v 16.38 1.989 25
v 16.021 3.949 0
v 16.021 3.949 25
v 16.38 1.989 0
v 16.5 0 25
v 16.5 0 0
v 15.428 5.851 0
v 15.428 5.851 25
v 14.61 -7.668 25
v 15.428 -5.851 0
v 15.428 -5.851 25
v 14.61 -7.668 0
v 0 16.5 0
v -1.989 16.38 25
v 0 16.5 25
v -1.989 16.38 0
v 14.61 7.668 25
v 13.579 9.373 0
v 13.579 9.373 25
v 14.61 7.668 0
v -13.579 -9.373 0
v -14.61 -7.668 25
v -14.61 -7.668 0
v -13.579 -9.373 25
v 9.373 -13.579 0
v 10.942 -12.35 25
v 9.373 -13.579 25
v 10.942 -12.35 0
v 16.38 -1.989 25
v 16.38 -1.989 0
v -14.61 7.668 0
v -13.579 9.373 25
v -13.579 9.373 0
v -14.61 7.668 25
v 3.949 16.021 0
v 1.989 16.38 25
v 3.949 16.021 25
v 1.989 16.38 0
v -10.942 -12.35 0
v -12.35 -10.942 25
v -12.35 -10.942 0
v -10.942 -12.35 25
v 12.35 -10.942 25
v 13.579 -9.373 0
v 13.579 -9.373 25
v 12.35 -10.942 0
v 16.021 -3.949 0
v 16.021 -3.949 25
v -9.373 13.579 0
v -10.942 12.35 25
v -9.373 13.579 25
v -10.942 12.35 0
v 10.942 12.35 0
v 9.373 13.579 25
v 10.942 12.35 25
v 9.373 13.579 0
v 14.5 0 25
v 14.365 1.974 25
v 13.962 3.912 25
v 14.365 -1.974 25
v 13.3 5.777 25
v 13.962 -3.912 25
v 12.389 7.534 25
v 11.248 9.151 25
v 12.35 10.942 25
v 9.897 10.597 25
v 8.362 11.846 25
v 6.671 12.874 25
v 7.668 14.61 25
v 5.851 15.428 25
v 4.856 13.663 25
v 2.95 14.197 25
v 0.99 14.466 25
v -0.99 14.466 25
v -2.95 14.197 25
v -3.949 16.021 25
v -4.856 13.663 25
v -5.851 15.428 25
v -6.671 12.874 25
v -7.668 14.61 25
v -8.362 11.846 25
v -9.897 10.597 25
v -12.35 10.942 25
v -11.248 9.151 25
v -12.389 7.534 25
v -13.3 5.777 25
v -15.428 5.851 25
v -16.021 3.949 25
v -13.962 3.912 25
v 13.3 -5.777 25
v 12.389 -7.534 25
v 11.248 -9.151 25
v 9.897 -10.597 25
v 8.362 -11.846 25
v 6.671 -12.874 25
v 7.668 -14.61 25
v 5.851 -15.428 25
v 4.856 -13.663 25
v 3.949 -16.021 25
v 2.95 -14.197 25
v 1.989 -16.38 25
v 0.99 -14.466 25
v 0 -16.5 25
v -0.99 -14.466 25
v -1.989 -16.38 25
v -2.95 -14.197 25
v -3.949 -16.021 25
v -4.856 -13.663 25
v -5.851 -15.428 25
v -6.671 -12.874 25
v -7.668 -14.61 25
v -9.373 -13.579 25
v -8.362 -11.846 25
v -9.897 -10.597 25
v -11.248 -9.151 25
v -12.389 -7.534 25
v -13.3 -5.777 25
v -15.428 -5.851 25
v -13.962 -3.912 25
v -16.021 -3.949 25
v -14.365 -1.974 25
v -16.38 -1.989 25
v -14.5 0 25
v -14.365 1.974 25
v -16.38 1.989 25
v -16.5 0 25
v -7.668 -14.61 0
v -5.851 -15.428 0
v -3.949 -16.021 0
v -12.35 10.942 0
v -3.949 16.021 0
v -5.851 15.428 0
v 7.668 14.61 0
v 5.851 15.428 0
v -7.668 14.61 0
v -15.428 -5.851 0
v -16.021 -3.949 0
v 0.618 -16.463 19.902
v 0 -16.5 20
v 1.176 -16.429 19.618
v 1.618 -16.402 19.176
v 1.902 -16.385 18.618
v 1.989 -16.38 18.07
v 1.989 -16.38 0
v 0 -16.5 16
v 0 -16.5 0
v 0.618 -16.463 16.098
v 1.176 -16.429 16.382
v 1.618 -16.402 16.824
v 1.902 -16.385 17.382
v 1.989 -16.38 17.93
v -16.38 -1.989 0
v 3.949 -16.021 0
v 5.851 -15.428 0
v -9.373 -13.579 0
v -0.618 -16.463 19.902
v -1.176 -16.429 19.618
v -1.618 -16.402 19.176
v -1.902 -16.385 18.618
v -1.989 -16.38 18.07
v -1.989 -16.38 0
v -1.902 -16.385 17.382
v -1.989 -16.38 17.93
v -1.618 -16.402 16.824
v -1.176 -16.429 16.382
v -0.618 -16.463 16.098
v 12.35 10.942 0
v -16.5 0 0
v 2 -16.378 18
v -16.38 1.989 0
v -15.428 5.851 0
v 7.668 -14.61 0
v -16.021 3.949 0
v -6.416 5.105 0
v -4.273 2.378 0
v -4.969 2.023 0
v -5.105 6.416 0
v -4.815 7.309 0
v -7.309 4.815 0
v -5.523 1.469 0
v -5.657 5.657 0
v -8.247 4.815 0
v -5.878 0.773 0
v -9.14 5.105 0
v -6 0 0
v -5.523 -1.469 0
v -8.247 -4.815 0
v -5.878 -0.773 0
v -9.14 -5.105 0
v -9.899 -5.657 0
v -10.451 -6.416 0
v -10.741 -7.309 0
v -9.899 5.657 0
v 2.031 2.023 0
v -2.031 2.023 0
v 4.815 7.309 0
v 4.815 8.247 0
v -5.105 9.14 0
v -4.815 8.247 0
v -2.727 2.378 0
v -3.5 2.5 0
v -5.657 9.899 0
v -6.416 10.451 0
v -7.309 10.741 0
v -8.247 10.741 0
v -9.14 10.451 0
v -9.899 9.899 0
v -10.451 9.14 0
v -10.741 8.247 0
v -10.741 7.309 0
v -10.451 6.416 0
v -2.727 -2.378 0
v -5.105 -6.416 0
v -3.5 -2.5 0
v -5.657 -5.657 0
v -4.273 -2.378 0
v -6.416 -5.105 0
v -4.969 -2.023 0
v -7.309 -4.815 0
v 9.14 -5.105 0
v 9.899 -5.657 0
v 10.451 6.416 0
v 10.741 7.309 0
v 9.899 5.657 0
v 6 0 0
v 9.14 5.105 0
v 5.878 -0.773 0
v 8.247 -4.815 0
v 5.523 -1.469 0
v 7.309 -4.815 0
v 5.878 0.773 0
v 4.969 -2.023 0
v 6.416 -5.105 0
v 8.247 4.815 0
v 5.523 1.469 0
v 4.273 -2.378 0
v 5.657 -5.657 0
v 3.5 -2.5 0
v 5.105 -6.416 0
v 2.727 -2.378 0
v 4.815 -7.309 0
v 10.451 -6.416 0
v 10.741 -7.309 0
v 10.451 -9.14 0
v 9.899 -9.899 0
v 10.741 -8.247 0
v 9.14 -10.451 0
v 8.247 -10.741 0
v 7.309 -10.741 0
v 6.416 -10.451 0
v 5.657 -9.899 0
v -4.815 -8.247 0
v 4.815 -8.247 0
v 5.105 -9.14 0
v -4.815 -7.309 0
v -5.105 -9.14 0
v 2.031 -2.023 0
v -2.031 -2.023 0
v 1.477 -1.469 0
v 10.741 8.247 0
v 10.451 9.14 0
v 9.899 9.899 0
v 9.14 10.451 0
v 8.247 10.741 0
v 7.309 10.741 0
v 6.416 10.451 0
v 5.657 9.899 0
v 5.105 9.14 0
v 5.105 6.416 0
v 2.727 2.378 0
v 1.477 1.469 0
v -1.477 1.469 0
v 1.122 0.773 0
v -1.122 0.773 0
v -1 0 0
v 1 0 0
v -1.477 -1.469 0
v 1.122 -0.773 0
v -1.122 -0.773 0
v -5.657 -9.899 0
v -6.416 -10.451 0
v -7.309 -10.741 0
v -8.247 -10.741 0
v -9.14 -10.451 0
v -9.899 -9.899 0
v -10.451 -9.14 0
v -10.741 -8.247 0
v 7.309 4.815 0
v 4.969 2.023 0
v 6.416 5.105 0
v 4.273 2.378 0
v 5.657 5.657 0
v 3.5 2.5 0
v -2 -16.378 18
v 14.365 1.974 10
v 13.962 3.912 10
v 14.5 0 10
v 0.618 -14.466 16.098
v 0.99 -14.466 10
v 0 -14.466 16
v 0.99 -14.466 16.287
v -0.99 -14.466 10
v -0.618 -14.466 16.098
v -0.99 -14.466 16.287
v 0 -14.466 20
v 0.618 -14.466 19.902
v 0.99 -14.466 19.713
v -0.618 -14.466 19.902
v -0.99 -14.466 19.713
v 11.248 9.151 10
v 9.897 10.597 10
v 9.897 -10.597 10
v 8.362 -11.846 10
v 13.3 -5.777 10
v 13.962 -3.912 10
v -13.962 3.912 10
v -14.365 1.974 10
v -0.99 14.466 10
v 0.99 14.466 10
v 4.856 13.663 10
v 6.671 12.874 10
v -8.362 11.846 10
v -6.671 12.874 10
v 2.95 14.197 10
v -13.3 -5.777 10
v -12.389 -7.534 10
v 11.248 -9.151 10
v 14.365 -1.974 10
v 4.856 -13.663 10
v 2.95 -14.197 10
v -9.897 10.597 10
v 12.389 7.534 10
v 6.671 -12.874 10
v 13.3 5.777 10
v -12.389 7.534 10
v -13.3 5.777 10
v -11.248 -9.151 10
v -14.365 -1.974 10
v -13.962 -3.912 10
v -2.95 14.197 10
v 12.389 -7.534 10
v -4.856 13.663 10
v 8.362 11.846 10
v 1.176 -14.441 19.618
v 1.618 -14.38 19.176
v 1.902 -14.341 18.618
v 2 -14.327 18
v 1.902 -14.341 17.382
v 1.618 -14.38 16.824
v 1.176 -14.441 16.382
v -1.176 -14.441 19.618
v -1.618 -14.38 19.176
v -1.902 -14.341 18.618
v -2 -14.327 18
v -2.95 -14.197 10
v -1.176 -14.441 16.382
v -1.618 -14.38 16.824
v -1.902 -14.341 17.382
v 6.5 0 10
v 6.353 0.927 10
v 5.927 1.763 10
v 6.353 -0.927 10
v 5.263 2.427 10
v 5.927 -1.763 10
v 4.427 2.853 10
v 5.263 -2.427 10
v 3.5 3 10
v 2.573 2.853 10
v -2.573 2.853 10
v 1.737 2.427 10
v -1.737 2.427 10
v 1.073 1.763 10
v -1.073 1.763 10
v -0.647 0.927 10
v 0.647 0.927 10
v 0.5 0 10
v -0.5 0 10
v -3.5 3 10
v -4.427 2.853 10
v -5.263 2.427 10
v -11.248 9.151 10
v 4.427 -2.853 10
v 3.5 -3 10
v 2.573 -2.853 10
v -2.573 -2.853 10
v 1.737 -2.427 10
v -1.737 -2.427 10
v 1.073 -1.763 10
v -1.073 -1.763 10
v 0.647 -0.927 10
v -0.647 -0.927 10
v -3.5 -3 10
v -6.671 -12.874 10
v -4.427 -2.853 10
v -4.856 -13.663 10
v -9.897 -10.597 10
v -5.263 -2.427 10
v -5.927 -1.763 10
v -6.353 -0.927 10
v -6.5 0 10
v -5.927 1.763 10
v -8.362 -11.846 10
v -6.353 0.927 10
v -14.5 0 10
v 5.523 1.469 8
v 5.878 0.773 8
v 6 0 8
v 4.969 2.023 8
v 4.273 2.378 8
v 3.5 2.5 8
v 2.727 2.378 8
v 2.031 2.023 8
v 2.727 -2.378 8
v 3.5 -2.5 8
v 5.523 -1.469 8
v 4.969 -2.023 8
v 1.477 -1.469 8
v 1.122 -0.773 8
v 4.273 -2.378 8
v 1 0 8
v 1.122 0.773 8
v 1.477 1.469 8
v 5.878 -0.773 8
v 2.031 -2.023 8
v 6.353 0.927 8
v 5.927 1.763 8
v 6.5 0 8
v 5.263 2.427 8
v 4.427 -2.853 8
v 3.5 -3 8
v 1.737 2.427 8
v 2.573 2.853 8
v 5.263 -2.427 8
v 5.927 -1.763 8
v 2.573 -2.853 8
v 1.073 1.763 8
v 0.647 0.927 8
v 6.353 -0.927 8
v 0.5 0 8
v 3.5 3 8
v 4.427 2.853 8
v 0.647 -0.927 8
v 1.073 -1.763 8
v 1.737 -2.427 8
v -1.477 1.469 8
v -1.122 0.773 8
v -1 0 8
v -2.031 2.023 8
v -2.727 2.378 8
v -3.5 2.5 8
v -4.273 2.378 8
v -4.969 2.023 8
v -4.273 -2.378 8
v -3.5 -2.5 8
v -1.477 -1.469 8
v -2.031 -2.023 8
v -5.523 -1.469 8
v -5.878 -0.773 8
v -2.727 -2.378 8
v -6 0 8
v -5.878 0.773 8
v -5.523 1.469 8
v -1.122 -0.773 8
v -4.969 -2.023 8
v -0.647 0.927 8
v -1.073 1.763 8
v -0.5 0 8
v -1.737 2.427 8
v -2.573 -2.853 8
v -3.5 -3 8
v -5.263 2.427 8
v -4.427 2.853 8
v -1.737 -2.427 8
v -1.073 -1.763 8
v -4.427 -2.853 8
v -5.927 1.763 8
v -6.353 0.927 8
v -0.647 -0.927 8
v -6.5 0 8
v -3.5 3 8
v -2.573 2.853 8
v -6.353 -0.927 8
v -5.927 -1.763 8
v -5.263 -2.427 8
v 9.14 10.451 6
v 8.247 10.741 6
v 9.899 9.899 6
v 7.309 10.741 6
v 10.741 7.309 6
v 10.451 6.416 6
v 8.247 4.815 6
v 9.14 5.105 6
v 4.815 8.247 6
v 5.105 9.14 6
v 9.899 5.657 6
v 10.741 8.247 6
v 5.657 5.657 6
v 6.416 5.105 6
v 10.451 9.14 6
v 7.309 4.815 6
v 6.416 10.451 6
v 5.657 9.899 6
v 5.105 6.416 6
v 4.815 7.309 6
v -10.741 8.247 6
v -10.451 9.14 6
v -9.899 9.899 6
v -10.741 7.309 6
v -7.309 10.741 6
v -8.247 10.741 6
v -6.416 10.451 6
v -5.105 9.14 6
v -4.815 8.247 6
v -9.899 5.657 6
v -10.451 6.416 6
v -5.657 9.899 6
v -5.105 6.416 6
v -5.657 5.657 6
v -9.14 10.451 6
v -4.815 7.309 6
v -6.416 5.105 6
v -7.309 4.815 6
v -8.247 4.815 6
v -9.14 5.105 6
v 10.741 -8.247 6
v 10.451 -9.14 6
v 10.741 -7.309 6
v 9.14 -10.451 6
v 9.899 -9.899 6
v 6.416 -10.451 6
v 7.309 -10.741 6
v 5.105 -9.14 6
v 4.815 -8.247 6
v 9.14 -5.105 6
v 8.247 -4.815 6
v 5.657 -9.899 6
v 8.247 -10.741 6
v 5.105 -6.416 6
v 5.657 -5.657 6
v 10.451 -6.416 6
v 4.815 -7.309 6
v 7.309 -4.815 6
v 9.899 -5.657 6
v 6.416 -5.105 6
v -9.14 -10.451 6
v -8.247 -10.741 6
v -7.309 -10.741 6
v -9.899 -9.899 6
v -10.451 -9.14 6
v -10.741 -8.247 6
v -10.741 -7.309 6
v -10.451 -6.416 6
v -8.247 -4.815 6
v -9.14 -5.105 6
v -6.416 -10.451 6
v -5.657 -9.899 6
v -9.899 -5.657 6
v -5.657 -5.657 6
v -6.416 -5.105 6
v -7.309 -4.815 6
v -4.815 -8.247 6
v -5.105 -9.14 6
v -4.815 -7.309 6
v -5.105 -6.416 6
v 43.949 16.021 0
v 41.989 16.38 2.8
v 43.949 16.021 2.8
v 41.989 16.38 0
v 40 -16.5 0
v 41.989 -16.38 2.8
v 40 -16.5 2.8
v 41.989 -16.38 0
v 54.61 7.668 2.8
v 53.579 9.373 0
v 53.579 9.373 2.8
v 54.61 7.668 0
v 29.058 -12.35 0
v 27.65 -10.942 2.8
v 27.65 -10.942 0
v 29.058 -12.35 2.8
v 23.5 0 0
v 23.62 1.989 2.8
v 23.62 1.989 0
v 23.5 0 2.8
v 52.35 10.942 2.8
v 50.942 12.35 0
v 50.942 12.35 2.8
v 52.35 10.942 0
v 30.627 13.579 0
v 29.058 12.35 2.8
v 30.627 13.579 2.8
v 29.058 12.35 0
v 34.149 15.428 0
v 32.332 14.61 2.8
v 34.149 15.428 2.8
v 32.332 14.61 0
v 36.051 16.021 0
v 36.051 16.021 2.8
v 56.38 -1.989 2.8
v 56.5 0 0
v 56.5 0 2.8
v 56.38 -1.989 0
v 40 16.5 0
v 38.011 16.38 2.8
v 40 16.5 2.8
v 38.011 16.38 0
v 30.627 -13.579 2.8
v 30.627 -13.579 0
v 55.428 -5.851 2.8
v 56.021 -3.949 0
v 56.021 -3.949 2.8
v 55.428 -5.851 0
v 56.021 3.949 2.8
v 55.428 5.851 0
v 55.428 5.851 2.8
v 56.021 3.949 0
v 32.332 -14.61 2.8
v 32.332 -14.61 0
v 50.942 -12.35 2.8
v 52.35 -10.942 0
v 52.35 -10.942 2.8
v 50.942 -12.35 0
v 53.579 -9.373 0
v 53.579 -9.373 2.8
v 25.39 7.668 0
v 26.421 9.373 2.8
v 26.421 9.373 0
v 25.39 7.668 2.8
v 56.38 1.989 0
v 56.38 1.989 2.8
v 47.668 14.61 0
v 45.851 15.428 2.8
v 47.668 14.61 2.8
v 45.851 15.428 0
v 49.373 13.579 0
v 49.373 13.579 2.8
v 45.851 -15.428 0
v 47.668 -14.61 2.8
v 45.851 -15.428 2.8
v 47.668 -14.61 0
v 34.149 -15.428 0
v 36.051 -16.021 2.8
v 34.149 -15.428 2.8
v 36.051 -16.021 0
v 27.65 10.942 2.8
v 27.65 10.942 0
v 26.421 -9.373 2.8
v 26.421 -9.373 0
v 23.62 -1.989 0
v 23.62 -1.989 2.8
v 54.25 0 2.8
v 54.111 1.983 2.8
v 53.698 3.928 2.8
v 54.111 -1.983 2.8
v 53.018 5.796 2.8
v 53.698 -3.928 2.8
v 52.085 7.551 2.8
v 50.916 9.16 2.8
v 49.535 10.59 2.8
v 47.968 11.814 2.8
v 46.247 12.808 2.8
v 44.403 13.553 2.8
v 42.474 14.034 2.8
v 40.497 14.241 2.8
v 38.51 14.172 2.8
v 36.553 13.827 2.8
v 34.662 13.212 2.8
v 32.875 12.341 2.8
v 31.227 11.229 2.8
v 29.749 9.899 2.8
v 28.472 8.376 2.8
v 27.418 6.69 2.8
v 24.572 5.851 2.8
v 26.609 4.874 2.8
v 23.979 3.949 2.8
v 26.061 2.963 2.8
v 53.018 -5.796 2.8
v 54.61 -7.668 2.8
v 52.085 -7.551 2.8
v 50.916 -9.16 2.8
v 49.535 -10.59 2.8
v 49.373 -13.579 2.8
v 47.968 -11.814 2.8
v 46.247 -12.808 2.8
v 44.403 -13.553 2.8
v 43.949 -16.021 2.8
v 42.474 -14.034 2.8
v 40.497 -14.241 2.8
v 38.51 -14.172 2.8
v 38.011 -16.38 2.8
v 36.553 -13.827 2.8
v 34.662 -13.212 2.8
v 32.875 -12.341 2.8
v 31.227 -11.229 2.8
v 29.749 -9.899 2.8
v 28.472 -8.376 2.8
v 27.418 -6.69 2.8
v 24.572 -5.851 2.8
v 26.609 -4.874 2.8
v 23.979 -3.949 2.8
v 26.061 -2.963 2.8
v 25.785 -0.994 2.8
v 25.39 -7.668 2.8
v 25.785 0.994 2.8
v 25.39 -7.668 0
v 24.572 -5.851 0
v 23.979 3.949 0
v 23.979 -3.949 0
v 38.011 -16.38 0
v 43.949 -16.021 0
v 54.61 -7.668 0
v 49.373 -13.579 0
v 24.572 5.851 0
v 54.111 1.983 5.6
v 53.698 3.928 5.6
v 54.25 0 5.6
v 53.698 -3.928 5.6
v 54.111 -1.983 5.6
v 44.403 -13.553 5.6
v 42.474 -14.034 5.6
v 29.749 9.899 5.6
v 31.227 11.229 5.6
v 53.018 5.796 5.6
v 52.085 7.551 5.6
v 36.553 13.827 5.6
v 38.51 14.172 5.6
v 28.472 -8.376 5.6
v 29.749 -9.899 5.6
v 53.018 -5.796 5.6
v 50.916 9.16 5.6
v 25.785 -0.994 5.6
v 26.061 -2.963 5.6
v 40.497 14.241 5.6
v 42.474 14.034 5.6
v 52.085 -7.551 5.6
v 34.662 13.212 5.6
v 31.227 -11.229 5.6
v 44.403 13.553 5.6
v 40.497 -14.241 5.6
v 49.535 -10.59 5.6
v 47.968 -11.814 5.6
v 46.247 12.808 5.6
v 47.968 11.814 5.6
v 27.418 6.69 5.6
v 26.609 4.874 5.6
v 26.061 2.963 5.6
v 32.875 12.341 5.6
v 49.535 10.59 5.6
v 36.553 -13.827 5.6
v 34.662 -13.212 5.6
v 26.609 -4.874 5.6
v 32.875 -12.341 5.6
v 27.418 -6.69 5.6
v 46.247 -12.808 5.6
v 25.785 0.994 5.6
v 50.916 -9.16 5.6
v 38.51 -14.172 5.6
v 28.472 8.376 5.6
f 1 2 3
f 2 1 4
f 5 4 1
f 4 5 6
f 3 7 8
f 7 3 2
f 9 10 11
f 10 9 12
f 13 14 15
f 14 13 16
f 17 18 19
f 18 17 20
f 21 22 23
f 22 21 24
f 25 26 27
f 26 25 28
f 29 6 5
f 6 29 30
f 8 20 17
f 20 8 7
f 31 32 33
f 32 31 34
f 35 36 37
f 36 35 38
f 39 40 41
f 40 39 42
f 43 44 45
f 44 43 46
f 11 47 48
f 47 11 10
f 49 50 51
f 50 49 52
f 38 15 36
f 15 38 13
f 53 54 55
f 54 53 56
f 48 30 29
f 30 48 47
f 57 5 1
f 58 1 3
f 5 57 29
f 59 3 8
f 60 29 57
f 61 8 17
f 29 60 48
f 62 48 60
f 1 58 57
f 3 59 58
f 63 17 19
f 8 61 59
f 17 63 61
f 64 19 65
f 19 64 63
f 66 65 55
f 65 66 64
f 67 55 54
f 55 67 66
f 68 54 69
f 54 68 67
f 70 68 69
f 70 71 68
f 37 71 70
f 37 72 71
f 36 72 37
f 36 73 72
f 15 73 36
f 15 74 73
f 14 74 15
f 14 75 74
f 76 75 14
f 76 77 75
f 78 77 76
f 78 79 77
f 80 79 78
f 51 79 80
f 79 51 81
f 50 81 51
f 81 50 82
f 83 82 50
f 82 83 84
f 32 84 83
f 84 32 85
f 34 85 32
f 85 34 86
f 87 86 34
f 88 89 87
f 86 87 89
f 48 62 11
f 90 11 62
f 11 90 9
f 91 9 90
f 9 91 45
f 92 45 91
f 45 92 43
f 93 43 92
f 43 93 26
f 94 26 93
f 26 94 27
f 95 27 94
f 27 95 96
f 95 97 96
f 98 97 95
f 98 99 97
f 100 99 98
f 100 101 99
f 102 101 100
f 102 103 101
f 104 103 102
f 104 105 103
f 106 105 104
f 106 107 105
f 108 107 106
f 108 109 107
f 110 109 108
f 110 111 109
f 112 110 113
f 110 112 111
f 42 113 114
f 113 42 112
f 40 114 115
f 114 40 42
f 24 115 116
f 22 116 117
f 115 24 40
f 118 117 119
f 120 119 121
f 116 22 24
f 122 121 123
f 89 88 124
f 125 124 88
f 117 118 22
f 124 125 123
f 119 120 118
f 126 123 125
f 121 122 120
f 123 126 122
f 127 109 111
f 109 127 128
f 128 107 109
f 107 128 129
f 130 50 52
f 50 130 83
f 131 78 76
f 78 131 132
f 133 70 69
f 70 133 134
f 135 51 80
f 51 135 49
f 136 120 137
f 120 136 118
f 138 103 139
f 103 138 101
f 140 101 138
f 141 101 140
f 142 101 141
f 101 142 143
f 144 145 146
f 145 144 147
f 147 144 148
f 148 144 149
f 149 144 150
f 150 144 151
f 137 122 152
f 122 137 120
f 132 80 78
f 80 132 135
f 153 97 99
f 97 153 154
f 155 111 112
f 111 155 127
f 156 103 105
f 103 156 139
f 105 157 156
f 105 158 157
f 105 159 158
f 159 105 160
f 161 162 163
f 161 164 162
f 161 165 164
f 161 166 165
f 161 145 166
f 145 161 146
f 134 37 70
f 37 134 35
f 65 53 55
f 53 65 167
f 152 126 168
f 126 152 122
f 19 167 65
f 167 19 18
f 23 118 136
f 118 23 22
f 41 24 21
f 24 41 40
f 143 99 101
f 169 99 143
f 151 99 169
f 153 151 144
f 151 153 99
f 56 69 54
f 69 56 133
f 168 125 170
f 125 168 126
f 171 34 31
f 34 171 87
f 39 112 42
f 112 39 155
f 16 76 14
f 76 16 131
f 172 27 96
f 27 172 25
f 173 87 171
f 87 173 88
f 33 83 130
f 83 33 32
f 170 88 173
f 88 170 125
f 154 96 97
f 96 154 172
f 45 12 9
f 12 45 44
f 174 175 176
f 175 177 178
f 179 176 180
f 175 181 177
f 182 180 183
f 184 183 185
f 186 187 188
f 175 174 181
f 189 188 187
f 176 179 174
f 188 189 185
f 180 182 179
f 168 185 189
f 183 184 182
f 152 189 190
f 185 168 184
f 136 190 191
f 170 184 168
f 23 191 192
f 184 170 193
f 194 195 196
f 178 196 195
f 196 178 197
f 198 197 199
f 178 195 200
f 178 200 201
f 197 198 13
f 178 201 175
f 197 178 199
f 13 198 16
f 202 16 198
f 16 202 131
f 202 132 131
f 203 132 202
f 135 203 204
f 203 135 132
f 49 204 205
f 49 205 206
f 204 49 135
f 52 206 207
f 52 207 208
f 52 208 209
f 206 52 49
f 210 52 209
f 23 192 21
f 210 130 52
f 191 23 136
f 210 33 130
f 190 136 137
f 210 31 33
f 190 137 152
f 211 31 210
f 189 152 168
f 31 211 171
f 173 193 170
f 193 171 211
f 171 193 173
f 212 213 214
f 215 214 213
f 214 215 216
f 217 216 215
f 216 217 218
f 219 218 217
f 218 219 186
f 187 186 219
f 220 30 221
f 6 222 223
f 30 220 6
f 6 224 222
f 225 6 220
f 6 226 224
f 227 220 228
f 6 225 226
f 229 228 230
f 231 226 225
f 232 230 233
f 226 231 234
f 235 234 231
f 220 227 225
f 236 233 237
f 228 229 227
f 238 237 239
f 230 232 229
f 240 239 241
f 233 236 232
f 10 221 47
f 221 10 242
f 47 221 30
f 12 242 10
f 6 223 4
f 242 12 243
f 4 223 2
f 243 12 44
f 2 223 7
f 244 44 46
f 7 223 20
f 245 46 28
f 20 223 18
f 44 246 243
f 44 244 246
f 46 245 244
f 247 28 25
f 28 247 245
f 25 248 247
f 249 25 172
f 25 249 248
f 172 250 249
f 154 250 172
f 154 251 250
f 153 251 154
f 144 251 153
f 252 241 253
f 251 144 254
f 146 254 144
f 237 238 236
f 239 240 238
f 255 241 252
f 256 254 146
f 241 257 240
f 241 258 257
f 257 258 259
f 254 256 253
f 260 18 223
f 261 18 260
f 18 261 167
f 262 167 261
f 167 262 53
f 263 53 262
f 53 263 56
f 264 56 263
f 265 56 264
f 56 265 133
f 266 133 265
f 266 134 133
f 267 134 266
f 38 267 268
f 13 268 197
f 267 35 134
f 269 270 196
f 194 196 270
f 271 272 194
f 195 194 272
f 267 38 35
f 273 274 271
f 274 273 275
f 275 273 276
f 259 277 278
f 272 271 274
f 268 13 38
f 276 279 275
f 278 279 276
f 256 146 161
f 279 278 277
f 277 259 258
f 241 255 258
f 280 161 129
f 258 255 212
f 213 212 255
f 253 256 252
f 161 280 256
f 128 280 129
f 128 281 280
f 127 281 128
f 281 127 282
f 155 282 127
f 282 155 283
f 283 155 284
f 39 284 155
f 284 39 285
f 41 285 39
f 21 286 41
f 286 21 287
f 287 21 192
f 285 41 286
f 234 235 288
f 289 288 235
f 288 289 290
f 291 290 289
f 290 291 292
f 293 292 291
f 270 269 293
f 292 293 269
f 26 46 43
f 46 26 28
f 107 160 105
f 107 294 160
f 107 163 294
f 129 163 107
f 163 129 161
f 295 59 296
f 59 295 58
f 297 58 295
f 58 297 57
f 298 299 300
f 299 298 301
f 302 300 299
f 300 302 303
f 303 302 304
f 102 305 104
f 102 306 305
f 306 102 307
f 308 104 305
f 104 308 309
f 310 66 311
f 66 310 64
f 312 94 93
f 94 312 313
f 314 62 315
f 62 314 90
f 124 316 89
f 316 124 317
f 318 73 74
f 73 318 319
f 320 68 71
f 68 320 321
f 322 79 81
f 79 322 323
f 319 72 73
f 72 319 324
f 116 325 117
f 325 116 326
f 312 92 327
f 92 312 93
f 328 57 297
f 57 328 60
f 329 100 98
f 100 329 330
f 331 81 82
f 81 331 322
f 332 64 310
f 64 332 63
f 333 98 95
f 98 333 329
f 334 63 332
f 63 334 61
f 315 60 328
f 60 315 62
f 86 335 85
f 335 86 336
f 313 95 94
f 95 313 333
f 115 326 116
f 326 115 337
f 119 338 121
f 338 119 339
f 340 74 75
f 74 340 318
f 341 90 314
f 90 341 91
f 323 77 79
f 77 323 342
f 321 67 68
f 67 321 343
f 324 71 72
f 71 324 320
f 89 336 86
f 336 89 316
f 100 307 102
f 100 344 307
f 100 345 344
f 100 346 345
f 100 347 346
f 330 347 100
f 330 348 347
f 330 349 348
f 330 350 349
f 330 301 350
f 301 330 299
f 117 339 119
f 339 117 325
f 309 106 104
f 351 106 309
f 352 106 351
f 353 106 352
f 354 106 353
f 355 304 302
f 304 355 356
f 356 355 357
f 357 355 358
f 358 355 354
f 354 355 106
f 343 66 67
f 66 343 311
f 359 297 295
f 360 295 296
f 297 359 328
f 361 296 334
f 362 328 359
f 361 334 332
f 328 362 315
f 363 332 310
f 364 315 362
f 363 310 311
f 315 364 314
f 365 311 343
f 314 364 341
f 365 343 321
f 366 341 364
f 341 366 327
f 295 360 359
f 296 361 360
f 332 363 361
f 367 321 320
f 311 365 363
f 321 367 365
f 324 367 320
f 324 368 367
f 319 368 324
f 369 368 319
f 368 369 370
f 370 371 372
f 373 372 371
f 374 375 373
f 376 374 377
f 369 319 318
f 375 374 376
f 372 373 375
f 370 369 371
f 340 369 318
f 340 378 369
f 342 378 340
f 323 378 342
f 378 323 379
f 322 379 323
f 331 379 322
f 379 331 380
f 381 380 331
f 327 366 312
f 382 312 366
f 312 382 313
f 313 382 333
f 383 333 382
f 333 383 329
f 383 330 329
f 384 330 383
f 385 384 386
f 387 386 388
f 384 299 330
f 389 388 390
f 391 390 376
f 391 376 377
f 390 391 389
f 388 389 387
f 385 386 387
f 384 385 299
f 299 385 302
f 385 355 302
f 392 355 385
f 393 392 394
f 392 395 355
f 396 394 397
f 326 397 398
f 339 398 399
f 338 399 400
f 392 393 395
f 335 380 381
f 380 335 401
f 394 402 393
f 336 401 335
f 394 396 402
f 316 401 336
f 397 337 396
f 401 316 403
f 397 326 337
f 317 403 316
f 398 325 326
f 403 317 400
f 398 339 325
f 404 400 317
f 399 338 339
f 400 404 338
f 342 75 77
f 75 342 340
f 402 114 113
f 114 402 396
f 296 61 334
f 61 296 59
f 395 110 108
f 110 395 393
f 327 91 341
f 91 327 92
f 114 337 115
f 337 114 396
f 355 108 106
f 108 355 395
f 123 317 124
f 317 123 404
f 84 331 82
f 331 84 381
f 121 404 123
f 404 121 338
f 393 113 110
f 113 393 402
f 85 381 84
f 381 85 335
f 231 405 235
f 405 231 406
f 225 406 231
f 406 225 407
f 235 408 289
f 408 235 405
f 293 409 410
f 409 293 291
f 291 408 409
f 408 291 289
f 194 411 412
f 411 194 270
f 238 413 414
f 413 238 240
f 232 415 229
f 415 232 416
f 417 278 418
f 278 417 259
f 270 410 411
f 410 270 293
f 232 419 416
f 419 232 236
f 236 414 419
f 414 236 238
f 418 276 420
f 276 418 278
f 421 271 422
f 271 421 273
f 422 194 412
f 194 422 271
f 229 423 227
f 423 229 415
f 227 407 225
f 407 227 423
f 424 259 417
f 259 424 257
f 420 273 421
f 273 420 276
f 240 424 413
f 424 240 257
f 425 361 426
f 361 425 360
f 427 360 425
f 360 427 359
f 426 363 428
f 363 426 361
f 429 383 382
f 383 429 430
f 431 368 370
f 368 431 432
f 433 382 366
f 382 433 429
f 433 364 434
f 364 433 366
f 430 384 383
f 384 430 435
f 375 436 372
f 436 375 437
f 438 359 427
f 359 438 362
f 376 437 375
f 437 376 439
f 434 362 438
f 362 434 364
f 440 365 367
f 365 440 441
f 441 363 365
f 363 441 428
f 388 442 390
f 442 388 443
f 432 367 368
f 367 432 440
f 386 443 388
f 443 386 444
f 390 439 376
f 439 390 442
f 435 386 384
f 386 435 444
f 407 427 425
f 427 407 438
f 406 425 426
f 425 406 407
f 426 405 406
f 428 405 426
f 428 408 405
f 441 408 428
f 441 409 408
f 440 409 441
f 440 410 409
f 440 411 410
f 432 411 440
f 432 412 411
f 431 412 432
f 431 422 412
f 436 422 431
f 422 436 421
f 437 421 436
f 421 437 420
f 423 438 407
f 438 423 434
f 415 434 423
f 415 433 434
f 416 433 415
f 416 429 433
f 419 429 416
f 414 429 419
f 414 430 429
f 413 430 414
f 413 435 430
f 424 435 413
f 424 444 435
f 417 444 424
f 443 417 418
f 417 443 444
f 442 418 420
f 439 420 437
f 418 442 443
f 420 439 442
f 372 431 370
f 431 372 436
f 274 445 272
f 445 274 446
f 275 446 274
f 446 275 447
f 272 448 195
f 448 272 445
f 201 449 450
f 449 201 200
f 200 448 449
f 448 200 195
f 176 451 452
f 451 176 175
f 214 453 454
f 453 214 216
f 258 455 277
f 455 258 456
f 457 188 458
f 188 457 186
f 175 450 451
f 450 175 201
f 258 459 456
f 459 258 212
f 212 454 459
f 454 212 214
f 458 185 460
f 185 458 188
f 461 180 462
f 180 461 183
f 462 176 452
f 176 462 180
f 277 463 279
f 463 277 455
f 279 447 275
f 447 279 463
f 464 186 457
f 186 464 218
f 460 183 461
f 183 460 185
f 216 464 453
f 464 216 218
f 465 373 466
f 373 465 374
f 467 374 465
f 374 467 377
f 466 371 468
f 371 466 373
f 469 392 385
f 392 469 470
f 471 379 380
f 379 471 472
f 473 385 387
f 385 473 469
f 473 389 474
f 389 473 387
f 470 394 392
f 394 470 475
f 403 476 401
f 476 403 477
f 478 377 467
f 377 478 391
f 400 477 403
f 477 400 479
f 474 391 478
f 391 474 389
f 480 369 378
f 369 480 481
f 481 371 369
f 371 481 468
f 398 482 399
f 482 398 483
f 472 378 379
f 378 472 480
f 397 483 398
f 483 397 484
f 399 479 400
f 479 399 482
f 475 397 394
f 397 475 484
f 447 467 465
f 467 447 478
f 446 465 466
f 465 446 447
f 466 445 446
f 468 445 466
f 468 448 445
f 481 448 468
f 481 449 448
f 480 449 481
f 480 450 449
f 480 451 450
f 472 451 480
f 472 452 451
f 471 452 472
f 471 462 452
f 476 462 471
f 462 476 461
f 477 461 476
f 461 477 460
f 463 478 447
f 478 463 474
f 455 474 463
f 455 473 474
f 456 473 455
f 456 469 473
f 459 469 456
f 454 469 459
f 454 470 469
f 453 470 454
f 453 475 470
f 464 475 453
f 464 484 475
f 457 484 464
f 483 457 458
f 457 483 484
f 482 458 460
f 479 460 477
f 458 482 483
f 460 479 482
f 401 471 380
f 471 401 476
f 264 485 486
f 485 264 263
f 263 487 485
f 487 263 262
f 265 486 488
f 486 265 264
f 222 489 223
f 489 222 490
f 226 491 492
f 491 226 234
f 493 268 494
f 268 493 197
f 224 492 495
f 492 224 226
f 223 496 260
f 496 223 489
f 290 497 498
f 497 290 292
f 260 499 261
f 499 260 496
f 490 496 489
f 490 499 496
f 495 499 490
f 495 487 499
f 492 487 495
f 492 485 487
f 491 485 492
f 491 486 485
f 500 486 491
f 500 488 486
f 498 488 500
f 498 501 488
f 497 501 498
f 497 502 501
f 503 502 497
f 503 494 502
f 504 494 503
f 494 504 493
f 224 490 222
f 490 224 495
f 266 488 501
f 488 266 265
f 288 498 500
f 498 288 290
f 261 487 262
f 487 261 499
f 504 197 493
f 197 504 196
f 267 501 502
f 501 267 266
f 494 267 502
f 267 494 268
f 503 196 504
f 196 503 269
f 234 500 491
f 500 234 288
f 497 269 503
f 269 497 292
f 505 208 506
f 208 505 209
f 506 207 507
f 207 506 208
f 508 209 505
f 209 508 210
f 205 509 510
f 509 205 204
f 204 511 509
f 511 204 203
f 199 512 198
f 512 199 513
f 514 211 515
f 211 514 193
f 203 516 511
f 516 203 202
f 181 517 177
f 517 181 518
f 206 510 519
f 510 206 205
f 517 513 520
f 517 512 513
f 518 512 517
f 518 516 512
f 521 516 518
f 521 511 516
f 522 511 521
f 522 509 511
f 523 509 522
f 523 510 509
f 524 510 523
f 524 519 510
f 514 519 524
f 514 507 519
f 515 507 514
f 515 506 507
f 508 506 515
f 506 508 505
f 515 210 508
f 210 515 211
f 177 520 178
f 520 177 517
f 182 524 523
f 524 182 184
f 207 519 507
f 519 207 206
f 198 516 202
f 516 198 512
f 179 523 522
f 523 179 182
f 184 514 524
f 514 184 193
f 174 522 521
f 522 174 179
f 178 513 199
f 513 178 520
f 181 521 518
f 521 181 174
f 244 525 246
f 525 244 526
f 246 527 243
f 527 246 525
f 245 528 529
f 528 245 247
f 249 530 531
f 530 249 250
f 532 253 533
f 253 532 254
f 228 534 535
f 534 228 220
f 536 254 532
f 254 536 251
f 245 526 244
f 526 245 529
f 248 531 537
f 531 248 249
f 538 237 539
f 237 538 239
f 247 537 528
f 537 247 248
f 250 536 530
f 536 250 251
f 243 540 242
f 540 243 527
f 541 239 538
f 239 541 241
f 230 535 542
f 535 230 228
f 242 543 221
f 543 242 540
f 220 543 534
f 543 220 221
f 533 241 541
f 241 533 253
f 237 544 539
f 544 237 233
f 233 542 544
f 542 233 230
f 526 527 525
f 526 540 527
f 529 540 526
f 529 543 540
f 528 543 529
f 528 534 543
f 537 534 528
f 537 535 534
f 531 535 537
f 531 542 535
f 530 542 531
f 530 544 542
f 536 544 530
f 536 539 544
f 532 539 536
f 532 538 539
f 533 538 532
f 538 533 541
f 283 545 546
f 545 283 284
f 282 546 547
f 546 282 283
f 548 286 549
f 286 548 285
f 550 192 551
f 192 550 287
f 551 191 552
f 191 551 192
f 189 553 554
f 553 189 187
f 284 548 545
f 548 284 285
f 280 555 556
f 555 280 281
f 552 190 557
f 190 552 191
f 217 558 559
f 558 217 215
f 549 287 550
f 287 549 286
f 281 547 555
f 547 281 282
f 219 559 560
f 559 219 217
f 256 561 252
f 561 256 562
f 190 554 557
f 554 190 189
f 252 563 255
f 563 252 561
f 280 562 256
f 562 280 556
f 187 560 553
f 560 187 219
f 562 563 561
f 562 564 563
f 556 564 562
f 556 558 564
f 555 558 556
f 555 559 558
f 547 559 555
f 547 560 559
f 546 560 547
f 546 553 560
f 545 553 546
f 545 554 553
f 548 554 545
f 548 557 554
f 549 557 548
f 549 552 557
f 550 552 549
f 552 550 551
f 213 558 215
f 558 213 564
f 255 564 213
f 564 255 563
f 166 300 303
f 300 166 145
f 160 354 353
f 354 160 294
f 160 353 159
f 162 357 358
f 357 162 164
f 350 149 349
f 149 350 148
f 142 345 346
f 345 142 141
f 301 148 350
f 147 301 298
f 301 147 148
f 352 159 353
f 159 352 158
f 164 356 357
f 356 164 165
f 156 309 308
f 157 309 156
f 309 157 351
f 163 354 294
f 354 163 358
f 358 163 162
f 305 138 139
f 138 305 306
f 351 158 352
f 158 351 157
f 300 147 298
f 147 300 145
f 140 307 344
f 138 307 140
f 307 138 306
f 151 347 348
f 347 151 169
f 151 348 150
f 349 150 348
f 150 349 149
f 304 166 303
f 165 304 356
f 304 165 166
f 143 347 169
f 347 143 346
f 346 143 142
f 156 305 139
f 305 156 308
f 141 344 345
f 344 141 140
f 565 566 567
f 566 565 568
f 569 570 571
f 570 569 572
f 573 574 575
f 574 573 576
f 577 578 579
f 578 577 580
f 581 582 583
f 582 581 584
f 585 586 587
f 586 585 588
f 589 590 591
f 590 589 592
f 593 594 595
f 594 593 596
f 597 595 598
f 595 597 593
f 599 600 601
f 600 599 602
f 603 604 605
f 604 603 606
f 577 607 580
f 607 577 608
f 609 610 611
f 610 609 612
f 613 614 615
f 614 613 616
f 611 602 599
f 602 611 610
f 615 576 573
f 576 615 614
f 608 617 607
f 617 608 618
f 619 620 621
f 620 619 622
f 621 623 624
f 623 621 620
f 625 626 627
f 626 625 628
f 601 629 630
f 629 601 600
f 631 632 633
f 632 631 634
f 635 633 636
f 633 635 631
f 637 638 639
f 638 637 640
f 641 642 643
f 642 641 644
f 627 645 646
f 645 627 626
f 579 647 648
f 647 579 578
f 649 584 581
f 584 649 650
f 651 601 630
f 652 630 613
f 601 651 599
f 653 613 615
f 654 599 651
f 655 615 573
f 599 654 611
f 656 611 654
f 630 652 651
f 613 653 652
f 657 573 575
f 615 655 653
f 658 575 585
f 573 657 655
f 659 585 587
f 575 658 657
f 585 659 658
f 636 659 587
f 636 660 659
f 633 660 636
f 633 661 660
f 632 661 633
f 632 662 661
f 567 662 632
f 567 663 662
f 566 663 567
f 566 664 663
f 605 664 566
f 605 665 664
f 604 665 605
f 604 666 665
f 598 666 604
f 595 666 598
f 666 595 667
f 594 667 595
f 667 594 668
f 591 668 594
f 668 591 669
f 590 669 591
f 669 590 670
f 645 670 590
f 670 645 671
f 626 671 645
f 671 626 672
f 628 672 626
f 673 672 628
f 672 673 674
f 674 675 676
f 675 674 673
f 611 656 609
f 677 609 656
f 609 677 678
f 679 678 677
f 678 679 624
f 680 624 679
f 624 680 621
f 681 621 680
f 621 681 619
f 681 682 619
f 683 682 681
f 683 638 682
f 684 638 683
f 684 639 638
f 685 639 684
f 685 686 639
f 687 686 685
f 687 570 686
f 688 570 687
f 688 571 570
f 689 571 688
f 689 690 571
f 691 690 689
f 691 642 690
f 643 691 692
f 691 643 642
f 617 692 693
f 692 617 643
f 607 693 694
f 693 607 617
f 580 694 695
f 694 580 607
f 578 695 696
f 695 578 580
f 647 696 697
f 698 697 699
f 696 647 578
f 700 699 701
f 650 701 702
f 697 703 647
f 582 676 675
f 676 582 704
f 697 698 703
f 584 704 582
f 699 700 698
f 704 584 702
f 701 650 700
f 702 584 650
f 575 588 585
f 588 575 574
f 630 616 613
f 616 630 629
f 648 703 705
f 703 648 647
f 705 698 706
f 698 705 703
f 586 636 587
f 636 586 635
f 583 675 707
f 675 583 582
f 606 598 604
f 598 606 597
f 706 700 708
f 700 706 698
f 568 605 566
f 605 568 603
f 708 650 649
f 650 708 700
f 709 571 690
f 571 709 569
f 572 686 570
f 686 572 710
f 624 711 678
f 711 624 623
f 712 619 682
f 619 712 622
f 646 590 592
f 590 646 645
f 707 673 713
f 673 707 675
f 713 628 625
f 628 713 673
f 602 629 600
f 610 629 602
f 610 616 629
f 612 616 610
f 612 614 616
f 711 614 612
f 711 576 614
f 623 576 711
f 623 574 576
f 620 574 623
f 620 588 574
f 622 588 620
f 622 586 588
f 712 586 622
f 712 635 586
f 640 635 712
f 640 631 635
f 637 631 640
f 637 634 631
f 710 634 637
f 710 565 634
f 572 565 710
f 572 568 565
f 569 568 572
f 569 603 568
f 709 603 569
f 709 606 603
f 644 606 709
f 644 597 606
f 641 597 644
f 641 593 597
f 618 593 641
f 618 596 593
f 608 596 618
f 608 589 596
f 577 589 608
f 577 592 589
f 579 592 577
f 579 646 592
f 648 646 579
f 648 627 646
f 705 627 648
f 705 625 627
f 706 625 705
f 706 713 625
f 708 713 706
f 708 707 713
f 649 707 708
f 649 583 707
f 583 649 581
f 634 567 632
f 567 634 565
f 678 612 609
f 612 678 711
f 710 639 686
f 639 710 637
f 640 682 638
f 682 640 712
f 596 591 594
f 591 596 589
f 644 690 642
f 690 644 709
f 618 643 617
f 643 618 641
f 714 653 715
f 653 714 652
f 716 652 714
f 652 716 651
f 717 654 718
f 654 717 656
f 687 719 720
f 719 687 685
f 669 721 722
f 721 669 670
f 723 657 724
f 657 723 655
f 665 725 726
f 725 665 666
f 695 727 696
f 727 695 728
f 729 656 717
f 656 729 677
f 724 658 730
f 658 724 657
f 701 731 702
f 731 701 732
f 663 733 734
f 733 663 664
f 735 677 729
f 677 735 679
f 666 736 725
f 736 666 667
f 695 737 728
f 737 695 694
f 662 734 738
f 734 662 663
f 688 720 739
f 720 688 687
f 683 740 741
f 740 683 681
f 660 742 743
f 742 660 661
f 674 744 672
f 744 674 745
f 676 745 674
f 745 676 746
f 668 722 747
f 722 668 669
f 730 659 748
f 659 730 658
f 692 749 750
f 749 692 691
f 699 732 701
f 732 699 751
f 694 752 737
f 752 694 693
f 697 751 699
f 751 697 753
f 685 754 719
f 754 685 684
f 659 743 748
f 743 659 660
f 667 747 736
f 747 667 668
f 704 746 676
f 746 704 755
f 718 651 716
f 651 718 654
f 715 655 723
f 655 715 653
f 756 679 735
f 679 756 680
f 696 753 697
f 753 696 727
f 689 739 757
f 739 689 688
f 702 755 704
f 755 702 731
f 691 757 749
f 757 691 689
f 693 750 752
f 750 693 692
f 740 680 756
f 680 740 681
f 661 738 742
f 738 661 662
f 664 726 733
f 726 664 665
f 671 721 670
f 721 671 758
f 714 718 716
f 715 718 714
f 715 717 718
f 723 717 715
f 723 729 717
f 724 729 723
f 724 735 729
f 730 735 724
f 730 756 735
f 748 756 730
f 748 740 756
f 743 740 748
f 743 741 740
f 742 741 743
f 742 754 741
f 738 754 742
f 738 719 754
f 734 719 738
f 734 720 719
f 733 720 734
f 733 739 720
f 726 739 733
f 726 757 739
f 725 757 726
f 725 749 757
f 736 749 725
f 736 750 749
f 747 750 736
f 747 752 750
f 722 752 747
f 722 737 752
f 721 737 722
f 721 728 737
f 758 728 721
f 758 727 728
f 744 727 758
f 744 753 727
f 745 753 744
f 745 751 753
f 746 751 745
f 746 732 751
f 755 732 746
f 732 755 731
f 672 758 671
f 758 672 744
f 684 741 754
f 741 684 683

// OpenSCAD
$fa = 1;

module magnethole()
{
  translate([0,0,-0.1]) cylinder(r=3, h=6.1, $fn=20);
}
//magnethole();


module ledhole()
{
  translate([0,0,-0.1]) cylinder(r=2.5, h=20, $fn=20);
  translate([0,0,8]) cylinder(r=3, h=20, $fn=20);
}
//ledhole();

module outer()
{
  difference() {
	cylinder(r=16.5, h=25);
      translate([0, 0, 10]) cylinder(r=14.5, h=25);
//      translate([0, 0, -1]) cylinder(r=6.5, h=5);
  }
}

module lid()
{
  union()
 {
    cylinder(r=16.5, h=2.8);
    translate([0,0,2.8]) cylinder(r=14.25, h=2.8);
  }
}

//lid();

union() {
difference() {
  outer();
  rotate(45) translate([11,0,0]) magnethole();
  rotate(135) translate([11,0,0]) magnethole();
  rotate(-45) translate([11,0,0]) magnethole();
  rotate(-135) translate([11,0,0]) magnethole();

  translate([3.5,0,0]) ledhole();
  translate([-3.5,0,0]) ledhole();
  translate([0,0,18]) rotate([90,90]) cylinder(r=2, h=20, $fn=20);
}


  translate([40,0,0]) lid();

}
